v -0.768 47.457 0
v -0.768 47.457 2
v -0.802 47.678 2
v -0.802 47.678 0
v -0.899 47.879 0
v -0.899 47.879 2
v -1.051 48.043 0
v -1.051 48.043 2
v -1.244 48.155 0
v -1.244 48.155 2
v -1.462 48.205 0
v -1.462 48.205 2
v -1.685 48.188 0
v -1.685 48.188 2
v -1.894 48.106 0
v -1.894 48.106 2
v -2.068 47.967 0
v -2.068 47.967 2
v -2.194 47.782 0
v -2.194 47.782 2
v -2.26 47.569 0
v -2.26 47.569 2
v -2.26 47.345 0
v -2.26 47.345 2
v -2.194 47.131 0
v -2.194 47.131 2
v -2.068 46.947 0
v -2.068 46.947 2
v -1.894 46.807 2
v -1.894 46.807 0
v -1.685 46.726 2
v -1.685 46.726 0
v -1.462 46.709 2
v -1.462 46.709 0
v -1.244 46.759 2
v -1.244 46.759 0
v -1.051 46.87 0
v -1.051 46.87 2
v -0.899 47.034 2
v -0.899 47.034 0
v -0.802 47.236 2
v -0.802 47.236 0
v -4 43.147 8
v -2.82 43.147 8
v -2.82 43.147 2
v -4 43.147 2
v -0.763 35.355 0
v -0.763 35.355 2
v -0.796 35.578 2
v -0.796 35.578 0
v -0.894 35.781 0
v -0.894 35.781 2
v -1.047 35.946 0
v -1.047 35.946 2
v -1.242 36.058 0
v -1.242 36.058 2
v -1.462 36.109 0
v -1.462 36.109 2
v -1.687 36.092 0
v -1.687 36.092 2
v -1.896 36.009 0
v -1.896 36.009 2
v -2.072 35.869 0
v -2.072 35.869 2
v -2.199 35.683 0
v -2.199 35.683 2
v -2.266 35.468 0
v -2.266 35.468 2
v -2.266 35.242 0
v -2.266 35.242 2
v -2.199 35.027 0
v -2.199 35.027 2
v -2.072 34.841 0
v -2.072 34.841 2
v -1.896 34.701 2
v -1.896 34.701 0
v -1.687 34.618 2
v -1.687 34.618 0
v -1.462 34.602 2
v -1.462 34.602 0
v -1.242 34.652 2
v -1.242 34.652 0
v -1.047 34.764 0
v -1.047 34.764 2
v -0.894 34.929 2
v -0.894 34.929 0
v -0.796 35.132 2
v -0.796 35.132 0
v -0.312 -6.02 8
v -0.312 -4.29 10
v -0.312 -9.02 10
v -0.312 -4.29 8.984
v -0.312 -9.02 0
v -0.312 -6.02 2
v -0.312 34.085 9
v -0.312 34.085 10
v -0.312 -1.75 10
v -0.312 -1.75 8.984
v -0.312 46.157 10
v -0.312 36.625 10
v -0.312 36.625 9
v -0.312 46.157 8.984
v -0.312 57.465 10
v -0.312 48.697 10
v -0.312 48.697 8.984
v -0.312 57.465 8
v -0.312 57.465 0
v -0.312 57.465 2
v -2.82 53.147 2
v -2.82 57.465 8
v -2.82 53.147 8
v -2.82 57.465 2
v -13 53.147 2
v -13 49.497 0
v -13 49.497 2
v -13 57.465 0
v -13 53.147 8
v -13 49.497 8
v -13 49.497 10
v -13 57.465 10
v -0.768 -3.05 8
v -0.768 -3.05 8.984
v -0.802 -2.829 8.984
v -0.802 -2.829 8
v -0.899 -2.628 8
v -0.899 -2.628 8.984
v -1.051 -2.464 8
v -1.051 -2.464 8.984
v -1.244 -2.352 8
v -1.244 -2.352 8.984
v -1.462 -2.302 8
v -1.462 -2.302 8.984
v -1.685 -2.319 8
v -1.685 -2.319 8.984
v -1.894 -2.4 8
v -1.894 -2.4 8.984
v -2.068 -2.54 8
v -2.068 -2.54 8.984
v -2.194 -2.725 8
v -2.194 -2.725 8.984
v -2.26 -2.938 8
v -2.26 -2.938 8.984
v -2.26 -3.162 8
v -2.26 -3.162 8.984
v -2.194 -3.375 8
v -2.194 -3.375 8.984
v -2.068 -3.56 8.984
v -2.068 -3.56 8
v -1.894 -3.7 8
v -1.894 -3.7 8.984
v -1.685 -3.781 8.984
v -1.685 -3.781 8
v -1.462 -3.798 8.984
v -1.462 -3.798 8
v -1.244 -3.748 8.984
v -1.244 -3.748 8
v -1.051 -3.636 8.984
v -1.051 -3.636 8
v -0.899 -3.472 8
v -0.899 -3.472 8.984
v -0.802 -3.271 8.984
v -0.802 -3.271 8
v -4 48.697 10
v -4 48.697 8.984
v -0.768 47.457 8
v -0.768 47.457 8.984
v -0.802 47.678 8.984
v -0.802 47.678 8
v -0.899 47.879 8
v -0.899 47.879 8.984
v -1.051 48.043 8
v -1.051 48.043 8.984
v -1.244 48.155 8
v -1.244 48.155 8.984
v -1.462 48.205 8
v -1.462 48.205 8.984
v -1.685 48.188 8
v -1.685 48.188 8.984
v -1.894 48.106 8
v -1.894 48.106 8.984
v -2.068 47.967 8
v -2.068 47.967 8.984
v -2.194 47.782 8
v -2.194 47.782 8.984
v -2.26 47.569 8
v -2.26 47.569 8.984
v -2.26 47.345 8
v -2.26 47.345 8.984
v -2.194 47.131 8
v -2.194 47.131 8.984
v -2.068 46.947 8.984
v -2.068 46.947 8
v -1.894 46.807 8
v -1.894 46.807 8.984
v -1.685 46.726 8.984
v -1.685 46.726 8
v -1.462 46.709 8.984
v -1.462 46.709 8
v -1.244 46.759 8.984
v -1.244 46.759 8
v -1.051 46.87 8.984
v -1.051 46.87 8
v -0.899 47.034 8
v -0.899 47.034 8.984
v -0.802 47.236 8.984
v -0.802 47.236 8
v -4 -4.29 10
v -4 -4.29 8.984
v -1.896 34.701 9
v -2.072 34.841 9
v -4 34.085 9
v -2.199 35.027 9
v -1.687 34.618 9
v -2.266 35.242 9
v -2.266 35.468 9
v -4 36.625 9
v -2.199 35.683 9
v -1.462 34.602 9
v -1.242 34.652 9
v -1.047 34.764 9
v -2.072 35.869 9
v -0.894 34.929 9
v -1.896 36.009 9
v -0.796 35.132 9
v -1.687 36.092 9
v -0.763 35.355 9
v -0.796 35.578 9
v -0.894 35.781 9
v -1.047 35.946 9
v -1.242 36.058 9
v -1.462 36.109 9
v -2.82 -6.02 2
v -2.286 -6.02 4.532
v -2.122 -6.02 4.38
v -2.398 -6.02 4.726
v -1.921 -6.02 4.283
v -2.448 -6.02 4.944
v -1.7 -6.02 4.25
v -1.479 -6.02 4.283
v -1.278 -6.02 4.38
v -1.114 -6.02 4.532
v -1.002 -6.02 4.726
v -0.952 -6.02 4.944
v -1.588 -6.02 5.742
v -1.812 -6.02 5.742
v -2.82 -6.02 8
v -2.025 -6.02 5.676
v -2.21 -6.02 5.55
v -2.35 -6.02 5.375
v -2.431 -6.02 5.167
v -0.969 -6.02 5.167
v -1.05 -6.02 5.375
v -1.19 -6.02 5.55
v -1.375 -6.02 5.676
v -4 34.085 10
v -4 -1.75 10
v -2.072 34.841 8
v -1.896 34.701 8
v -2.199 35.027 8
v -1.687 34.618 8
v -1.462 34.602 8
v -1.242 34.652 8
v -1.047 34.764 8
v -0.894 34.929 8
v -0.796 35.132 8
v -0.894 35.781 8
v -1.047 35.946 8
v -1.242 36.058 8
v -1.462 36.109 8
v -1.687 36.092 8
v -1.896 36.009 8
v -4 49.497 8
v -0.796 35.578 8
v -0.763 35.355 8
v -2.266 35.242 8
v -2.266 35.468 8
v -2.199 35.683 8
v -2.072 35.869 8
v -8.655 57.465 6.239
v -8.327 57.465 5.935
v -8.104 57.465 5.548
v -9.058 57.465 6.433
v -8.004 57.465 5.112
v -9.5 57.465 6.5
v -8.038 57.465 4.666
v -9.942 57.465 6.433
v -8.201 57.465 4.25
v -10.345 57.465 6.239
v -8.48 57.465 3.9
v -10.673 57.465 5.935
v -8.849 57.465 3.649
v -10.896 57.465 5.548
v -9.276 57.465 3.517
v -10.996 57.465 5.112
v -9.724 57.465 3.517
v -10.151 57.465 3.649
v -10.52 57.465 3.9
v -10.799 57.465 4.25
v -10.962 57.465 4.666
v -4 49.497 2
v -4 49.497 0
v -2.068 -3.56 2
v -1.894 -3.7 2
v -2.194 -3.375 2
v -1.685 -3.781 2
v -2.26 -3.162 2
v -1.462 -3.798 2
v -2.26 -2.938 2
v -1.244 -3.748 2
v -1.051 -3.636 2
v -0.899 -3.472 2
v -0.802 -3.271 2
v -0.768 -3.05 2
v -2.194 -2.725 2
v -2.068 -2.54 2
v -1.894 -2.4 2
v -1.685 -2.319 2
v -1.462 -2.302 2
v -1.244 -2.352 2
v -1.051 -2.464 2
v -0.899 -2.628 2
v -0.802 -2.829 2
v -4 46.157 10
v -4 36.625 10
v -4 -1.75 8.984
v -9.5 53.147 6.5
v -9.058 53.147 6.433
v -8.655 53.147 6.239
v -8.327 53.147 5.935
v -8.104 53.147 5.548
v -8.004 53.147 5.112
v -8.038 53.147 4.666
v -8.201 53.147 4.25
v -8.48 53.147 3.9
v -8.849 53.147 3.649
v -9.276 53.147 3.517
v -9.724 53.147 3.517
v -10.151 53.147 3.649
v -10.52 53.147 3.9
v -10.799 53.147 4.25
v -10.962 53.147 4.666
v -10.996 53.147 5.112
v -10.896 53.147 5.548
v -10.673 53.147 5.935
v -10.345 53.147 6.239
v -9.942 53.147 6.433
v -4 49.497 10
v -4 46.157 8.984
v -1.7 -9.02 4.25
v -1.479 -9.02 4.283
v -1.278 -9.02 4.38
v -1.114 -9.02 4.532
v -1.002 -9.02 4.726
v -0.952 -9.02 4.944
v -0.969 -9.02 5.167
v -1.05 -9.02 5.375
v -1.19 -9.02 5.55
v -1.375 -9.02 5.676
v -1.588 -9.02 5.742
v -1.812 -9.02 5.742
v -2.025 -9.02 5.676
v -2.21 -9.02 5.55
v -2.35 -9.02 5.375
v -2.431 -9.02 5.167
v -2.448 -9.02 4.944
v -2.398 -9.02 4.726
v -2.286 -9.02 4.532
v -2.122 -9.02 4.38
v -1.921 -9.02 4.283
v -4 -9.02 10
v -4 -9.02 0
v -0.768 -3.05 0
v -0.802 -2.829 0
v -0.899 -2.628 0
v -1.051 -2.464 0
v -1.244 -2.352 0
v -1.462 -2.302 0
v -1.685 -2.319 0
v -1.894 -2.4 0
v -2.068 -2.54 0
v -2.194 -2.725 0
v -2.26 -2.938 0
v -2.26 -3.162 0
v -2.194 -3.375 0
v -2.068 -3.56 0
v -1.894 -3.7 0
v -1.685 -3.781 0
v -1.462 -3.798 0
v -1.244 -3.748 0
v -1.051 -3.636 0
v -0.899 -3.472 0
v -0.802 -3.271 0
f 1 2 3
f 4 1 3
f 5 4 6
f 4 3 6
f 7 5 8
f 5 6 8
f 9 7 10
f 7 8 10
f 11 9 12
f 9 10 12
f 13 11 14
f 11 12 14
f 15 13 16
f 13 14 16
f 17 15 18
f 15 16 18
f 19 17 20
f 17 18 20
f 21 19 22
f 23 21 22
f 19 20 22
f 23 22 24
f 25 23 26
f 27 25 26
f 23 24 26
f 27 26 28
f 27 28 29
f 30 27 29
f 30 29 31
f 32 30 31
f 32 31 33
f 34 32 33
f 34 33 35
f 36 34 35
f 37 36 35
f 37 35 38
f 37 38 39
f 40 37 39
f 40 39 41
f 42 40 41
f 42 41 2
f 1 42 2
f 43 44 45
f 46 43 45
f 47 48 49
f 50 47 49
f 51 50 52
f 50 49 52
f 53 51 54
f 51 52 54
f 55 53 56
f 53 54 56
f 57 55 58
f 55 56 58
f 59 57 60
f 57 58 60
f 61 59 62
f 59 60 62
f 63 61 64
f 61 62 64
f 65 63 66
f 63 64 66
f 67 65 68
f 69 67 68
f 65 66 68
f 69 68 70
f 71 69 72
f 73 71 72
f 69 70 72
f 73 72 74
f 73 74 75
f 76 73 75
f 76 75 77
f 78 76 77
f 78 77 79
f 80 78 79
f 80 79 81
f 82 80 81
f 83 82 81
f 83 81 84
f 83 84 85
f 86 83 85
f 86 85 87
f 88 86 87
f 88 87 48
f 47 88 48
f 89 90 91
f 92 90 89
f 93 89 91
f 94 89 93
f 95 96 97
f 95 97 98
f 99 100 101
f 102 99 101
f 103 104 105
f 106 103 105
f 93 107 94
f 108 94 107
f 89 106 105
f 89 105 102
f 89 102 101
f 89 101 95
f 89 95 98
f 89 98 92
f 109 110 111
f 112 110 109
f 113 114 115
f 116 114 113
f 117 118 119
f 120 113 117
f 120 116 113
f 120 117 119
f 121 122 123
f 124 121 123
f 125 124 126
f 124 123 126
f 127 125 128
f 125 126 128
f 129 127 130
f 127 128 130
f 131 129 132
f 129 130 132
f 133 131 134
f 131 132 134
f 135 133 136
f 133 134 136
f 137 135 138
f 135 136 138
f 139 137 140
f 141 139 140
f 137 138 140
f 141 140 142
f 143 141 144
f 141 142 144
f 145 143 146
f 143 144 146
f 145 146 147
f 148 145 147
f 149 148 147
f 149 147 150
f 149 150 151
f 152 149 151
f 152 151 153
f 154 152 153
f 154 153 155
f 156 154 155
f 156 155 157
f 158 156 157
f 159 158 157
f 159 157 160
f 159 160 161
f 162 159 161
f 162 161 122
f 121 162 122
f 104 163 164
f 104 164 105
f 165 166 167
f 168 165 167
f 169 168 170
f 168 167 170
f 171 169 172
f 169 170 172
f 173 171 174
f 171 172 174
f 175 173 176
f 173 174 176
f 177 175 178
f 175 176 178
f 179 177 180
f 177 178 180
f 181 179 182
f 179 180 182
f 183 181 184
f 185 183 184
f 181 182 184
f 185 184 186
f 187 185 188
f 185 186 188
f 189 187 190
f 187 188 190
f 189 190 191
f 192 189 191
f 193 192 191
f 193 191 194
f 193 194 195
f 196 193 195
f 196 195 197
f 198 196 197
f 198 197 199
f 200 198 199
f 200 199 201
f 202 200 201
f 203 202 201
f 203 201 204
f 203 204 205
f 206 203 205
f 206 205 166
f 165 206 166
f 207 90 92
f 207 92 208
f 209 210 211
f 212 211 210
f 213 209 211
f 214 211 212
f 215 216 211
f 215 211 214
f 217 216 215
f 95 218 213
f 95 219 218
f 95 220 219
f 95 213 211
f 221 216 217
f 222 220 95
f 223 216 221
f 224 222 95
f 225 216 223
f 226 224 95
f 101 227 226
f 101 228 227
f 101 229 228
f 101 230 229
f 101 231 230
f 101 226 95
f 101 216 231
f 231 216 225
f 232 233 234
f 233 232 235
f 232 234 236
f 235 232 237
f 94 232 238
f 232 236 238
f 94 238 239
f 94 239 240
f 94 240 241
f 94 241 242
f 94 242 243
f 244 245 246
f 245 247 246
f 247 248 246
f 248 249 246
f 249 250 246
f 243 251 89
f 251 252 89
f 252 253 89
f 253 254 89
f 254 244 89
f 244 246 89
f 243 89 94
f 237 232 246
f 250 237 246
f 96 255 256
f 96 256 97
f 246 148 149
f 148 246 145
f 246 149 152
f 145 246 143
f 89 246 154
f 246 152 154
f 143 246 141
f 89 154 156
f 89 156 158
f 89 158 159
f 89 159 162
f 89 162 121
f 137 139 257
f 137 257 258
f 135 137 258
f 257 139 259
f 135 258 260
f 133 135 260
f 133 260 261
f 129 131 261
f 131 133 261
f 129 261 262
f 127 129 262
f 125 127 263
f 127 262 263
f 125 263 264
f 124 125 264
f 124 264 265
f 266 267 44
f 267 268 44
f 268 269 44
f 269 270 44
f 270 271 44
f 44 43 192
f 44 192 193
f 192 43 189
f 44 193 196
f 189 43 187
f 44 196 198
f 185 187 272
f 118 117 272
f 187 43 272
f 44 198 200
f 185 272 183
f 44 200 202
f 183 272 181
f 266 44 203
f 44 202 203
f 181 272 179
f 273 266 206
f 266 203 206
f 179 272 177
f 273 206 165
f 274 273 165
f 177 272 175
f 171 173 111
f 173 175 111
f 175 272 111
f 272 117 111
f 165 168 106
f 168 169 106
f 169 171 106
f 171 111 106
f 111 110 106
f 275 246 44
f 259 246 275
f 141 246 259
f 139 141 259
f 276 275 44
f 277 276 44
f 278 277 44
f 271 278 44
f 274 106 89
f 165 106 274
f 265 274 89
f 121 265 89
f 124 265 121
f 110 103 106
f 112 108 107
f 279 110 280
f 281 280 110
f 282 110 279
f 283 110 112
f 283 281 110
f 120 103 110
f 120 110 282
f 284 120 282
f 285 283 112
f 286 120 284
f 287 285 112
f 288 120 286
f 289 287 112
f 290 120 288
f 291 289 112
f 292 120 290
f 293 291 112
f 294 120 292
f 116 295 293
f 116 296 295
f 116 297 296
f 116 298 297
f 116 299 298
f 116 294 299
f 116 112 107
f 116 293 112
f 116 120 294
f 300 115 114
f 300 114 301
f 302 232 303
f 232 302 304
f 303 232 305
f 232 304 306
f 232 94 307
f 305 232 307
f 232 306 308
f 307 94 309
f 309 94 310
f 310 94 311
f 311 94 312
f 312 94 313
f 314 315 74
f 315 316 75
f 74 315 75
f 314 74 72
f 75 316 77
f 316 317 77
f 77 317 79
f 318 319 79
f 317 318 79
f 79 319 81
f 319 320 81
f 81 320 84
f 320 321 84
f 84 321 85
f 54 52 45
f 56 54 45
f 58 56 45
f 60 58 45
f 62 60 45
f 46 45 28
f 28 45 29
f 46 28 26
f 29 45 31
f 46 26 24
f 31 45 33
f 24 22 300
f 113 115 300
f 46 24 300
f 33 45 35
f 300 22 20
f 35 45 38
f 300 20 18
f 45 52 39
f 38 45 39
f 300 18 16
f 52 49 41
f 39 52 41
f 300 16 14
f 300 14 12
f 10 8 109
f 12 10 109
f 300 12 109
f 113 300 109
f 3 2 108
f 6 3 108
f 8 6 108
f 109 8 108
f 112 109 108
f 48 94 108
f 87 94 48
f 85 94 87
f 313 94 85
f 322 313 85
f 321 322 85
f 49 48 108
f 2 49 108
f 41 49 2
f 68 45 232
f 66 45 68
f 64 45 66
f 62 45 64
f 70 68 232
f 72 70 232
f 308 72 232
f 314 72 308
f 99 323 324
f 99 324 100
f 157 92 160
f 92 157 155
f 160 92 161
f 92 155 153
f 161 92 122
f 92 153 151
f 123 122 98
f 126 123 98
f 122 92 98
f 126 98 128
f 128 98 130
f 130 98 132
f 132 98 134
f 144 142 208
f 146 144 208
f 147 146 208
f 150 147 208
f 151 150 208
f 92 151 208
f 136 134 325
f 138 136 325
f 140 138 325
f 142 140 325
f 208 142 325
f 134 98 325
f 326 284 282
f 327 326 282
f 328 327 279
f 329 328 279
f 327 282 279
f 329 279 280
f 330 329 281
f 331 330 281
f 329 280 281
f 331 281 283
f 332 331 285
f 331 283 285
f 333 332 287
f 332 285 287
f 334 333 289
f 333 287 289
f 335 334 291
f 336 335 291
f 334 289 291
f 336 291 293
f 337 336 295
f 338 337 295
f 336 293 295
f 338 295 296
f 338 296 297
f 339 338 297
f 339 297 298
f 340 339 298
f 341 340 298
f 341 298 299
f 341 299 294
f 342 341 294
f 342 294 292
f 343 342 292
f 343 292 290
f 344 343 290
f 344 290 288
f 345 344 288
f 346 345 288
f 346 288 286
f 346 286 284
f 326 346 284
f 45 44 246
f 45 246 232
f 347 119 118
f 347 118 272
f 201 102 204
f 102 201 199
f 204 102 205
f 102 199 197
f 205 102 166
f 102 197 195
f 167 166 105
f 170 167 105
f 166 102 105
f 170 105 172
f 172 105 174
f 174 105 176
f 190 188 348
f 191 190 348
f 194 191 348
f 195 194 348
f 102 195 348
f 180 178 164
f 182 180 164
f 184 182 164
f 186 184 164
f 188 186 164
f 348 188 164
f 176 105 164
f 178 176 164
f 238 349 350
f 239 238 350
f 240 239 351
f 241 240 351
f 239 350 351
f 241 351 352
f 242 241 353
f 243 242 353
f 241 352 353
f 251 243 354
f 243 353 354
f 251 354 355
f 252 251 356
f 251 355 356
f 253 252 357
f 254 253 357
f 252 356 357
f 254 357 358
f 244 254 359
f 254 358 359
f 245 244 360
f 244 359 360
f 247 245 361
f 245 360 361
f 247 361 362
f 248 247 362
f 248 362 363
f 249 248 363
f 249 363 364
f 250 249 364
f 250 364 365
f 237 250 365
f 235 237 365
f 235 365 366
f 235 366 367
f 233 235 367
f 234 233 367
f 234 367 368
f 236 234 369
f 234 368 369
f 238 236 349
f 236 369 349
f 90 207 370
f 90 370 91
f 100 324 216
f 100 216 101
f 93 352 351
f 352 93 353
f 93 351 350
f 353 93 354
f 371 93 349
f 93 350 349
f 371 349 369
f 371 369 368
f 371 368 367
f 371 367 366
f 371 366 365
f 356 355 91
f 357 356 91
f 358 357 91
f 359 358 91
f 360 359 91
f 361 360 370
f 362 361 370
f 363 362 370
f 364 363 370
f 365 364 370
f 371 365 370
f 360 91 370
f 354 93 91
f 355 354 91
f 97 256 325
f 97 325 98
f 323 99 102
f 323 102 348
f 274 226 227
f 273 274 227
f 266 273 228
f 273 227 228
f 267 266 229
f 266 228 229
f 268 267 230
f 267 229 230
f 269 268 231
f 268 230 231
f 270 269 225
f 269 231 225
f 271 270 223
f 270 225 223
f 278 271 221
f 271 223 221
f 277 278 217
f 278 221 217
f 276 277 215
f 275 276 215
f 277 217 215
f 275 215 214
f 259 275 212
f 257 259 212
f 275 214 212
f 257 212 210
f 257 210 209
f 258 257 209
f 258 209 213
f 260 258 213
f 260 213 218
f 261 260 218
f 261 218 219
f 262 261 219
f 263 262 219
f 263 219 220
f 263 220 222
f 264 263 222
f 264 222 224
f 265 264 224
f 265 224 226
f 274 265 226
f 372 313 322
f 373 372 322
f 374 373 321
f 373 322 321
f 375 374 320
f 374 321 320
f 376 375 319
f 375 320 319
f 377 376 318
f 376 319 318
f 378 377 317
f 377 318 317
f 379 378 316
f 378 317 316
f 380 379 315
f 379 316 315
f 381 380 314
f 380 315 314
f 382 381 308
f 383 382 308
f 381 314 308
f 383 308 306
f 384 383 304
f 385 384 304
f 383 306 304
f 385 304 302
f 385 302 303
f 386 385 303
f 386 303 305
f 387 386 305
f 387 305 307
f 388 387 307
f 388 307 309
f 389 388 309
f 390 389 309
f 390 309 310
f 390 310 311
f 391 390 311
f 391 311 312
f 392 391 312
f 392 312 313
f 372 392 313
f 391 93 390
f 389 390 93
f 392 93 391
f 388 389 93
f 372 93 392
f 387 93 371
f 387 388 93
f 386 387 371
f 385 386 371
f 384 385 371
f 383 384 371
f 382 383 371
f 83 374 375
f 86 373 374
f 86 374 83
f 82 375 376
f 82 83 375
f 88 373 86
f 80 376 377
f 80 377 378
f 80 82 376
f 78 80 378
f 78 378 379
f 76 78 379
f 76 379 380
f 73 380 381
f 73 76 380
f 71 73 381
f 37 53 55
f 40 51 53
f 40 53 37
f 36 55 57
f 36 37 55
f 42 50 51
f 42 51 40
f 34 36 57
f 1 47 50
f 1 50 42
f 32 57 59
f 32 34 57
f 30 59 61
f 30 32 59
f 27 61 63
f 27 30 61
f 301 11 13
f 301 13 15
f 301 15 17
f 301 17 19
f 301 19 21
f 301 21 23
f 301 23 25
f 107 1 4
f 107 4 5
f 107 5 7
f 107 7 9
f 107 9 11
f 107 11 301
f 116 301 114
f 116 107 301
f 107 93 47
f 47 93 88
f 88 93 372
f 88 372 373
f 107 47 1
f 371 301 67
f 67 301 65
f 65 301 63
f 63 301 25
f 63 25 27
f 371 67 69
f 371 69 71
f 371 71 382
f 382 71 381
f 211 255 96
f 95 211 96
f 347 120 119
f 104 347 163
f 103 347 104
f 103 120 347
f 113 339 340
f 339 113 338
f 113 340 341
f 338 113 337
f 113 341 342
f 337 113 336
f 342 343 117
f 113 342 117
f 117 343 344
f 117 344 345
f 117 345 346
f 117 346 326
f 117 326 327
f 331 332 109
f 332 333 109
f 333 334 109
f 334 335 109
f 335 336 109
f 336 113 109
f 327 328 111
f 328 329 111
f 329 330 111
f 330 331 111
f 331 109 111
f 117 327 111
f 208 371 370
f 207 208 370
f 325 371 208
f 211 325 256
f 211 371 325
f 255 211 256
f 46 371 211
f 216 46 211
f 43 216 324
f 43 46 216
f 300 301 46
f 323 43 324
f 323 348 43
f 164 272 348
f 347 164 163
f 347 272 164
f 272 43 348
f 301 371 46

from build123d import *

# Parameters (mm, degrees)
BOSS_EXTRUDE2_DEPTH = 10
SKETCH2_W           = 6
SKETCH2_H           = 21.5
CUT_EXTRUDE1_DEPTH  = 2
SKETCH18_W          = 10
SKETCH18_H          = 4
CUT_EXTRUDE6_DEPTH  = 2.32
BOSS_EXTRUDE4_DEPTH = 35.965
SKETCH20_W          = 10
SKETCH20_H          = 4.318
BOSS_EXTRUDE5_DEPTH = 9
SKETCH21_W          = 2
SKETCH21_H          = 57.465
BOSS_EXTRUDE6_DEPTH = 0.889
BOSS_EXTRUDE7_DEPTH = 9.02
CUT_EXTRUDE7_DEPTH  = 1.016
SKETCH24_W          = 4.069
SKETCH24_H          = 2.54
CUT_EXTRUDE8_DEPTH  = 1
SKETCH30_R          = 0.75565
CUT_EXTRUDE14_DEPTH = 95.738007626
SKETCH34_R          = 1.5
CUT_EXTRUDE18_DEPTH = 10
SKETCH35_R          = 0.75
CUT_EXTRUDE19_DEPTH = 60.59814159
SKETCH36_W          = 6
SKETCH36_H          = 10
CUT_EXTRUDE20_DEPTH = 10
SKETCH37_W          = 9
SKETCH37_H          = 2
BOSS_EXTRUDE8_DEPTH = 3.65
SKETCH38_W          = 4.069
SKETCH38_H          = 10
BOSS_EXTRUDE9_DEPTH = 3
SKETCH39_R          = 0.75
CUT_EXTRUDE21_DEPTH = 3
SKETCH40_W          = 0.381
SKETCH40_H          = 10
CUT_EXTRUDE22_DEPTH = 69.478136839


with BuildPart() as part:
    # Sketch1 → Boss-Extrude2 (new body)
    with BuildSketch(Plane.XY):
        Polygon((-4, 0), (-0.82, 0), (-0.82, 21.5), (-6.32, 21.5), (-6.32, 17.5), (-4, 17.5), align=None)
    extrude(amount=BOSS_EXTRUDE2_DEPTH)

    # Sketch2 → Cut-Extrude1 (cut)
    with BuildSketch(Plane(origin=(-0.82, 0, 0), x_dir=(0, 0, -1), z_dir=(1, 0, 0))):
        with Locations((-5, 10.75)):
            Rectangle(SKETCH2_W, SKETCH2_H)
    extrude(amount=-CUT_EXTRUDE1_DEPTH, mode=Mode.SUBTRACT)

    # Sketch18 → Cut-Extrude6 (cut)
    with BuildSketch(Plane.ZY.offset(6.32)):
        with Locations((5, 19.5)):
            Rectangle(SKETCH18_W, SKETCH18_H)
    extrude(amount=-CUT_EXTRUDE6_DEPTH, mode=Mode.SUBTRACT)

    # Sketch19 → Boss-Extrude4 (add)
    with BuildSketch(Plane(origin=(0, 21.5, 0), x_dir=(1, 0, 0), z_dir=(0, 1, 0))):
        Polygon((-0.82, -10), (-4, -10), (-4, 0), (-0.82, 0), (-0.82, -2), (-2.82, -2), (-2.82, -8), (-0.82, -8), align=None)
    extrude(amount=BOSS_EXTRUDE4_DEPTH)

    # Sketch20 → Boss-Extrude5 (add)
    with BuildSketch(Plane.ZY.offset(4)):
        with Locations((5, 55.306)):
            Rectangle(SKETCH20_W, SKETCH20_H)
    extrude(amount=BOSS_EXTRUDE5_DEPTH)

    # Sketch21 → Boss-Extrude6 (add)
    with BuildSketch(Plane(origin=(-0.82, 0, 0), x_dir=(0, 0, -1), z_dir=(1, 0, 0))):
        with Locations((-9, 28.7325)):
            Rectangle(SKETCH21_W, SKETCH21_H)
        with Locations((-1, 28.7325)):
            Rectangle(SKETCH21_W, SKETCH21_H)
    extrude(amount=BOSS_EXTRUDE6_DEPTH)

    # Sketch22 → Boss-Extrude7 (add)
    with BuildSketch(Plane.XZ):
        Polygon((-4, 10), (0.069, 10), (0.069, 8), (-2.82, 8), (-2.82, 2), (0.069, 2), (0.069, 0), (-4, 0), align=None)
    extrude(amount=BOSS_EXTRUDE7_DEPTH)

    # Sketch23 → Cut-Extrude7 (cut)
    with BuildSketch(Plane.XY.offset(10)):
        Polygon((0.069, -3.02), (0.069, -4.29), (-4, -4.29), (-4, -1.75), (0.069, -1.75), align=None)
        Polygon((-4, 47.426731456), (-4, 48.696731456), (0.069, 48.696731456), (0.069, 46.156731456), (-4, 46.156731456), align=None)
    extrude(amount=-CUT_EXTRUDE7_DEPTH, mode=Mode.SUBTRACT)

    # Sketch24 → Cut-Extrude8 (cut)
    with BuildSketch(Plane.XY.offset(10)):
        with Locations((-1.9655, 35.355048592)):
            Rectangle(SKETCH24_W, SKETCH24_H)
    extrude(amount=-CUT_EXTRUDE8_DEPTH, mode=Mode.SUBTRACT)

    # Sketch30 → Cut-Extrude14 (cut, through all)
    with BuildSketch(Plane(origin=(35.063086629, -23.678267082, 9), x_dir=(1, 0, 0), z_dir=(0, 0, 1))):
        with Locations((-36.581586629, 59.033315674)):
            Circle(SKETCH30_R)
    extrude(amount=-CUT_EXTRUDE14_DEPTH, mode=Mode.SUBTRACT)

    # Sketch34 → Cut-Extrude18 (cut)
    with BuildSketch(Plane(origin=(0, 57.465, 0), x_dir=(1, 0, 0), z_dir=(0, 1, 0))):
        with Locations(Location((-9.5, -5, 0), (0, 0, 270))):
            Circle(SKETCH34_R)
    extrude(amount=-CUT_EXTRUDE18_DEPTH, mode=Mode.SUBTRACT)

    # Sketch35 → Cut-Extrude19 (cut, through all)
    with BuildSketch(Plane.XY.offset(8.984)):
        with Locations((-1.5185, 47.456731456)):
            Circle(SKETCH35_R)
        with Locations((-1.5185, -3.05)):
            Circle(SKETCH35_R)
    extrude(amount=-CUT_EXTRUDE19_DEPTH, mode=Mode.SUBTRACT)

    # Sketch36 → Cut-Extrude20 (cut)
    with BuildSketch(Plane(origin=(-2.82, 0, 0), x_dir=(0, 0, -1), z_dir=(1, 0, 0))):
        with Locations((-5, 48.147)):
            Rectangle(SKETCH36_W, SKETCH36_H)
    extrude(amount=-CUT_EXTRUDE20_DEPTH, mode=Mode.SUBTRACT)

    # Sketch37 → Boss-Extrude8 (add)
    with BuildSketch(Plane.XZ.offset(-53.147)):
        with Locations((-8.5, 9)):
            Rectangle(SKETCH37_W, SKETCH37_H)
        with Locations((-8.5, 1)):
            Rectangle(SKETCH37_W, SKETCH37_H)
    extrude(amount=BOSS_EXTRUDE8_DEPTH)

    # Sketch38 → Boss-Extrude9 (add)
    with BuildSketch(Plane.XZ.offset(9.02)):
        with Locations((-1.9655, 5)):
            Rectangle(SKETCH38_W, SKETCH38_H)
    extrude(amount=-BOSS_EXTRUDE9_DEPTH)

    # Sketch39 → Cut-Extrude21 (cut)
    with BuildSketch(Plane.XZ.offset(9.02)):
        with Locations(Location((-1.7, 5, 0), (0, 0, 270))):
            Circle(SKETCH39_R)
    extrude(amount=-CUT_EXTRUDE21_DEPTH, mode=Mode.SUBTRACT)

    # Sketch40 → Cut-Extrude22 (cut, through all)
    with BuildSketch(Plane(origin=(0, 57.465, 0), x_dir=(1, 0, 0), z_dir=(0, 1, 0))):
        with Locations((-0.1215, -5)):
            Rectangle(SKETCH40_W, SKETCH40_H)
    extrude(amount=-CUT_EXTRUDE22_DEPTH, mode=Mode.SUBTRACT)


solid = part.part
